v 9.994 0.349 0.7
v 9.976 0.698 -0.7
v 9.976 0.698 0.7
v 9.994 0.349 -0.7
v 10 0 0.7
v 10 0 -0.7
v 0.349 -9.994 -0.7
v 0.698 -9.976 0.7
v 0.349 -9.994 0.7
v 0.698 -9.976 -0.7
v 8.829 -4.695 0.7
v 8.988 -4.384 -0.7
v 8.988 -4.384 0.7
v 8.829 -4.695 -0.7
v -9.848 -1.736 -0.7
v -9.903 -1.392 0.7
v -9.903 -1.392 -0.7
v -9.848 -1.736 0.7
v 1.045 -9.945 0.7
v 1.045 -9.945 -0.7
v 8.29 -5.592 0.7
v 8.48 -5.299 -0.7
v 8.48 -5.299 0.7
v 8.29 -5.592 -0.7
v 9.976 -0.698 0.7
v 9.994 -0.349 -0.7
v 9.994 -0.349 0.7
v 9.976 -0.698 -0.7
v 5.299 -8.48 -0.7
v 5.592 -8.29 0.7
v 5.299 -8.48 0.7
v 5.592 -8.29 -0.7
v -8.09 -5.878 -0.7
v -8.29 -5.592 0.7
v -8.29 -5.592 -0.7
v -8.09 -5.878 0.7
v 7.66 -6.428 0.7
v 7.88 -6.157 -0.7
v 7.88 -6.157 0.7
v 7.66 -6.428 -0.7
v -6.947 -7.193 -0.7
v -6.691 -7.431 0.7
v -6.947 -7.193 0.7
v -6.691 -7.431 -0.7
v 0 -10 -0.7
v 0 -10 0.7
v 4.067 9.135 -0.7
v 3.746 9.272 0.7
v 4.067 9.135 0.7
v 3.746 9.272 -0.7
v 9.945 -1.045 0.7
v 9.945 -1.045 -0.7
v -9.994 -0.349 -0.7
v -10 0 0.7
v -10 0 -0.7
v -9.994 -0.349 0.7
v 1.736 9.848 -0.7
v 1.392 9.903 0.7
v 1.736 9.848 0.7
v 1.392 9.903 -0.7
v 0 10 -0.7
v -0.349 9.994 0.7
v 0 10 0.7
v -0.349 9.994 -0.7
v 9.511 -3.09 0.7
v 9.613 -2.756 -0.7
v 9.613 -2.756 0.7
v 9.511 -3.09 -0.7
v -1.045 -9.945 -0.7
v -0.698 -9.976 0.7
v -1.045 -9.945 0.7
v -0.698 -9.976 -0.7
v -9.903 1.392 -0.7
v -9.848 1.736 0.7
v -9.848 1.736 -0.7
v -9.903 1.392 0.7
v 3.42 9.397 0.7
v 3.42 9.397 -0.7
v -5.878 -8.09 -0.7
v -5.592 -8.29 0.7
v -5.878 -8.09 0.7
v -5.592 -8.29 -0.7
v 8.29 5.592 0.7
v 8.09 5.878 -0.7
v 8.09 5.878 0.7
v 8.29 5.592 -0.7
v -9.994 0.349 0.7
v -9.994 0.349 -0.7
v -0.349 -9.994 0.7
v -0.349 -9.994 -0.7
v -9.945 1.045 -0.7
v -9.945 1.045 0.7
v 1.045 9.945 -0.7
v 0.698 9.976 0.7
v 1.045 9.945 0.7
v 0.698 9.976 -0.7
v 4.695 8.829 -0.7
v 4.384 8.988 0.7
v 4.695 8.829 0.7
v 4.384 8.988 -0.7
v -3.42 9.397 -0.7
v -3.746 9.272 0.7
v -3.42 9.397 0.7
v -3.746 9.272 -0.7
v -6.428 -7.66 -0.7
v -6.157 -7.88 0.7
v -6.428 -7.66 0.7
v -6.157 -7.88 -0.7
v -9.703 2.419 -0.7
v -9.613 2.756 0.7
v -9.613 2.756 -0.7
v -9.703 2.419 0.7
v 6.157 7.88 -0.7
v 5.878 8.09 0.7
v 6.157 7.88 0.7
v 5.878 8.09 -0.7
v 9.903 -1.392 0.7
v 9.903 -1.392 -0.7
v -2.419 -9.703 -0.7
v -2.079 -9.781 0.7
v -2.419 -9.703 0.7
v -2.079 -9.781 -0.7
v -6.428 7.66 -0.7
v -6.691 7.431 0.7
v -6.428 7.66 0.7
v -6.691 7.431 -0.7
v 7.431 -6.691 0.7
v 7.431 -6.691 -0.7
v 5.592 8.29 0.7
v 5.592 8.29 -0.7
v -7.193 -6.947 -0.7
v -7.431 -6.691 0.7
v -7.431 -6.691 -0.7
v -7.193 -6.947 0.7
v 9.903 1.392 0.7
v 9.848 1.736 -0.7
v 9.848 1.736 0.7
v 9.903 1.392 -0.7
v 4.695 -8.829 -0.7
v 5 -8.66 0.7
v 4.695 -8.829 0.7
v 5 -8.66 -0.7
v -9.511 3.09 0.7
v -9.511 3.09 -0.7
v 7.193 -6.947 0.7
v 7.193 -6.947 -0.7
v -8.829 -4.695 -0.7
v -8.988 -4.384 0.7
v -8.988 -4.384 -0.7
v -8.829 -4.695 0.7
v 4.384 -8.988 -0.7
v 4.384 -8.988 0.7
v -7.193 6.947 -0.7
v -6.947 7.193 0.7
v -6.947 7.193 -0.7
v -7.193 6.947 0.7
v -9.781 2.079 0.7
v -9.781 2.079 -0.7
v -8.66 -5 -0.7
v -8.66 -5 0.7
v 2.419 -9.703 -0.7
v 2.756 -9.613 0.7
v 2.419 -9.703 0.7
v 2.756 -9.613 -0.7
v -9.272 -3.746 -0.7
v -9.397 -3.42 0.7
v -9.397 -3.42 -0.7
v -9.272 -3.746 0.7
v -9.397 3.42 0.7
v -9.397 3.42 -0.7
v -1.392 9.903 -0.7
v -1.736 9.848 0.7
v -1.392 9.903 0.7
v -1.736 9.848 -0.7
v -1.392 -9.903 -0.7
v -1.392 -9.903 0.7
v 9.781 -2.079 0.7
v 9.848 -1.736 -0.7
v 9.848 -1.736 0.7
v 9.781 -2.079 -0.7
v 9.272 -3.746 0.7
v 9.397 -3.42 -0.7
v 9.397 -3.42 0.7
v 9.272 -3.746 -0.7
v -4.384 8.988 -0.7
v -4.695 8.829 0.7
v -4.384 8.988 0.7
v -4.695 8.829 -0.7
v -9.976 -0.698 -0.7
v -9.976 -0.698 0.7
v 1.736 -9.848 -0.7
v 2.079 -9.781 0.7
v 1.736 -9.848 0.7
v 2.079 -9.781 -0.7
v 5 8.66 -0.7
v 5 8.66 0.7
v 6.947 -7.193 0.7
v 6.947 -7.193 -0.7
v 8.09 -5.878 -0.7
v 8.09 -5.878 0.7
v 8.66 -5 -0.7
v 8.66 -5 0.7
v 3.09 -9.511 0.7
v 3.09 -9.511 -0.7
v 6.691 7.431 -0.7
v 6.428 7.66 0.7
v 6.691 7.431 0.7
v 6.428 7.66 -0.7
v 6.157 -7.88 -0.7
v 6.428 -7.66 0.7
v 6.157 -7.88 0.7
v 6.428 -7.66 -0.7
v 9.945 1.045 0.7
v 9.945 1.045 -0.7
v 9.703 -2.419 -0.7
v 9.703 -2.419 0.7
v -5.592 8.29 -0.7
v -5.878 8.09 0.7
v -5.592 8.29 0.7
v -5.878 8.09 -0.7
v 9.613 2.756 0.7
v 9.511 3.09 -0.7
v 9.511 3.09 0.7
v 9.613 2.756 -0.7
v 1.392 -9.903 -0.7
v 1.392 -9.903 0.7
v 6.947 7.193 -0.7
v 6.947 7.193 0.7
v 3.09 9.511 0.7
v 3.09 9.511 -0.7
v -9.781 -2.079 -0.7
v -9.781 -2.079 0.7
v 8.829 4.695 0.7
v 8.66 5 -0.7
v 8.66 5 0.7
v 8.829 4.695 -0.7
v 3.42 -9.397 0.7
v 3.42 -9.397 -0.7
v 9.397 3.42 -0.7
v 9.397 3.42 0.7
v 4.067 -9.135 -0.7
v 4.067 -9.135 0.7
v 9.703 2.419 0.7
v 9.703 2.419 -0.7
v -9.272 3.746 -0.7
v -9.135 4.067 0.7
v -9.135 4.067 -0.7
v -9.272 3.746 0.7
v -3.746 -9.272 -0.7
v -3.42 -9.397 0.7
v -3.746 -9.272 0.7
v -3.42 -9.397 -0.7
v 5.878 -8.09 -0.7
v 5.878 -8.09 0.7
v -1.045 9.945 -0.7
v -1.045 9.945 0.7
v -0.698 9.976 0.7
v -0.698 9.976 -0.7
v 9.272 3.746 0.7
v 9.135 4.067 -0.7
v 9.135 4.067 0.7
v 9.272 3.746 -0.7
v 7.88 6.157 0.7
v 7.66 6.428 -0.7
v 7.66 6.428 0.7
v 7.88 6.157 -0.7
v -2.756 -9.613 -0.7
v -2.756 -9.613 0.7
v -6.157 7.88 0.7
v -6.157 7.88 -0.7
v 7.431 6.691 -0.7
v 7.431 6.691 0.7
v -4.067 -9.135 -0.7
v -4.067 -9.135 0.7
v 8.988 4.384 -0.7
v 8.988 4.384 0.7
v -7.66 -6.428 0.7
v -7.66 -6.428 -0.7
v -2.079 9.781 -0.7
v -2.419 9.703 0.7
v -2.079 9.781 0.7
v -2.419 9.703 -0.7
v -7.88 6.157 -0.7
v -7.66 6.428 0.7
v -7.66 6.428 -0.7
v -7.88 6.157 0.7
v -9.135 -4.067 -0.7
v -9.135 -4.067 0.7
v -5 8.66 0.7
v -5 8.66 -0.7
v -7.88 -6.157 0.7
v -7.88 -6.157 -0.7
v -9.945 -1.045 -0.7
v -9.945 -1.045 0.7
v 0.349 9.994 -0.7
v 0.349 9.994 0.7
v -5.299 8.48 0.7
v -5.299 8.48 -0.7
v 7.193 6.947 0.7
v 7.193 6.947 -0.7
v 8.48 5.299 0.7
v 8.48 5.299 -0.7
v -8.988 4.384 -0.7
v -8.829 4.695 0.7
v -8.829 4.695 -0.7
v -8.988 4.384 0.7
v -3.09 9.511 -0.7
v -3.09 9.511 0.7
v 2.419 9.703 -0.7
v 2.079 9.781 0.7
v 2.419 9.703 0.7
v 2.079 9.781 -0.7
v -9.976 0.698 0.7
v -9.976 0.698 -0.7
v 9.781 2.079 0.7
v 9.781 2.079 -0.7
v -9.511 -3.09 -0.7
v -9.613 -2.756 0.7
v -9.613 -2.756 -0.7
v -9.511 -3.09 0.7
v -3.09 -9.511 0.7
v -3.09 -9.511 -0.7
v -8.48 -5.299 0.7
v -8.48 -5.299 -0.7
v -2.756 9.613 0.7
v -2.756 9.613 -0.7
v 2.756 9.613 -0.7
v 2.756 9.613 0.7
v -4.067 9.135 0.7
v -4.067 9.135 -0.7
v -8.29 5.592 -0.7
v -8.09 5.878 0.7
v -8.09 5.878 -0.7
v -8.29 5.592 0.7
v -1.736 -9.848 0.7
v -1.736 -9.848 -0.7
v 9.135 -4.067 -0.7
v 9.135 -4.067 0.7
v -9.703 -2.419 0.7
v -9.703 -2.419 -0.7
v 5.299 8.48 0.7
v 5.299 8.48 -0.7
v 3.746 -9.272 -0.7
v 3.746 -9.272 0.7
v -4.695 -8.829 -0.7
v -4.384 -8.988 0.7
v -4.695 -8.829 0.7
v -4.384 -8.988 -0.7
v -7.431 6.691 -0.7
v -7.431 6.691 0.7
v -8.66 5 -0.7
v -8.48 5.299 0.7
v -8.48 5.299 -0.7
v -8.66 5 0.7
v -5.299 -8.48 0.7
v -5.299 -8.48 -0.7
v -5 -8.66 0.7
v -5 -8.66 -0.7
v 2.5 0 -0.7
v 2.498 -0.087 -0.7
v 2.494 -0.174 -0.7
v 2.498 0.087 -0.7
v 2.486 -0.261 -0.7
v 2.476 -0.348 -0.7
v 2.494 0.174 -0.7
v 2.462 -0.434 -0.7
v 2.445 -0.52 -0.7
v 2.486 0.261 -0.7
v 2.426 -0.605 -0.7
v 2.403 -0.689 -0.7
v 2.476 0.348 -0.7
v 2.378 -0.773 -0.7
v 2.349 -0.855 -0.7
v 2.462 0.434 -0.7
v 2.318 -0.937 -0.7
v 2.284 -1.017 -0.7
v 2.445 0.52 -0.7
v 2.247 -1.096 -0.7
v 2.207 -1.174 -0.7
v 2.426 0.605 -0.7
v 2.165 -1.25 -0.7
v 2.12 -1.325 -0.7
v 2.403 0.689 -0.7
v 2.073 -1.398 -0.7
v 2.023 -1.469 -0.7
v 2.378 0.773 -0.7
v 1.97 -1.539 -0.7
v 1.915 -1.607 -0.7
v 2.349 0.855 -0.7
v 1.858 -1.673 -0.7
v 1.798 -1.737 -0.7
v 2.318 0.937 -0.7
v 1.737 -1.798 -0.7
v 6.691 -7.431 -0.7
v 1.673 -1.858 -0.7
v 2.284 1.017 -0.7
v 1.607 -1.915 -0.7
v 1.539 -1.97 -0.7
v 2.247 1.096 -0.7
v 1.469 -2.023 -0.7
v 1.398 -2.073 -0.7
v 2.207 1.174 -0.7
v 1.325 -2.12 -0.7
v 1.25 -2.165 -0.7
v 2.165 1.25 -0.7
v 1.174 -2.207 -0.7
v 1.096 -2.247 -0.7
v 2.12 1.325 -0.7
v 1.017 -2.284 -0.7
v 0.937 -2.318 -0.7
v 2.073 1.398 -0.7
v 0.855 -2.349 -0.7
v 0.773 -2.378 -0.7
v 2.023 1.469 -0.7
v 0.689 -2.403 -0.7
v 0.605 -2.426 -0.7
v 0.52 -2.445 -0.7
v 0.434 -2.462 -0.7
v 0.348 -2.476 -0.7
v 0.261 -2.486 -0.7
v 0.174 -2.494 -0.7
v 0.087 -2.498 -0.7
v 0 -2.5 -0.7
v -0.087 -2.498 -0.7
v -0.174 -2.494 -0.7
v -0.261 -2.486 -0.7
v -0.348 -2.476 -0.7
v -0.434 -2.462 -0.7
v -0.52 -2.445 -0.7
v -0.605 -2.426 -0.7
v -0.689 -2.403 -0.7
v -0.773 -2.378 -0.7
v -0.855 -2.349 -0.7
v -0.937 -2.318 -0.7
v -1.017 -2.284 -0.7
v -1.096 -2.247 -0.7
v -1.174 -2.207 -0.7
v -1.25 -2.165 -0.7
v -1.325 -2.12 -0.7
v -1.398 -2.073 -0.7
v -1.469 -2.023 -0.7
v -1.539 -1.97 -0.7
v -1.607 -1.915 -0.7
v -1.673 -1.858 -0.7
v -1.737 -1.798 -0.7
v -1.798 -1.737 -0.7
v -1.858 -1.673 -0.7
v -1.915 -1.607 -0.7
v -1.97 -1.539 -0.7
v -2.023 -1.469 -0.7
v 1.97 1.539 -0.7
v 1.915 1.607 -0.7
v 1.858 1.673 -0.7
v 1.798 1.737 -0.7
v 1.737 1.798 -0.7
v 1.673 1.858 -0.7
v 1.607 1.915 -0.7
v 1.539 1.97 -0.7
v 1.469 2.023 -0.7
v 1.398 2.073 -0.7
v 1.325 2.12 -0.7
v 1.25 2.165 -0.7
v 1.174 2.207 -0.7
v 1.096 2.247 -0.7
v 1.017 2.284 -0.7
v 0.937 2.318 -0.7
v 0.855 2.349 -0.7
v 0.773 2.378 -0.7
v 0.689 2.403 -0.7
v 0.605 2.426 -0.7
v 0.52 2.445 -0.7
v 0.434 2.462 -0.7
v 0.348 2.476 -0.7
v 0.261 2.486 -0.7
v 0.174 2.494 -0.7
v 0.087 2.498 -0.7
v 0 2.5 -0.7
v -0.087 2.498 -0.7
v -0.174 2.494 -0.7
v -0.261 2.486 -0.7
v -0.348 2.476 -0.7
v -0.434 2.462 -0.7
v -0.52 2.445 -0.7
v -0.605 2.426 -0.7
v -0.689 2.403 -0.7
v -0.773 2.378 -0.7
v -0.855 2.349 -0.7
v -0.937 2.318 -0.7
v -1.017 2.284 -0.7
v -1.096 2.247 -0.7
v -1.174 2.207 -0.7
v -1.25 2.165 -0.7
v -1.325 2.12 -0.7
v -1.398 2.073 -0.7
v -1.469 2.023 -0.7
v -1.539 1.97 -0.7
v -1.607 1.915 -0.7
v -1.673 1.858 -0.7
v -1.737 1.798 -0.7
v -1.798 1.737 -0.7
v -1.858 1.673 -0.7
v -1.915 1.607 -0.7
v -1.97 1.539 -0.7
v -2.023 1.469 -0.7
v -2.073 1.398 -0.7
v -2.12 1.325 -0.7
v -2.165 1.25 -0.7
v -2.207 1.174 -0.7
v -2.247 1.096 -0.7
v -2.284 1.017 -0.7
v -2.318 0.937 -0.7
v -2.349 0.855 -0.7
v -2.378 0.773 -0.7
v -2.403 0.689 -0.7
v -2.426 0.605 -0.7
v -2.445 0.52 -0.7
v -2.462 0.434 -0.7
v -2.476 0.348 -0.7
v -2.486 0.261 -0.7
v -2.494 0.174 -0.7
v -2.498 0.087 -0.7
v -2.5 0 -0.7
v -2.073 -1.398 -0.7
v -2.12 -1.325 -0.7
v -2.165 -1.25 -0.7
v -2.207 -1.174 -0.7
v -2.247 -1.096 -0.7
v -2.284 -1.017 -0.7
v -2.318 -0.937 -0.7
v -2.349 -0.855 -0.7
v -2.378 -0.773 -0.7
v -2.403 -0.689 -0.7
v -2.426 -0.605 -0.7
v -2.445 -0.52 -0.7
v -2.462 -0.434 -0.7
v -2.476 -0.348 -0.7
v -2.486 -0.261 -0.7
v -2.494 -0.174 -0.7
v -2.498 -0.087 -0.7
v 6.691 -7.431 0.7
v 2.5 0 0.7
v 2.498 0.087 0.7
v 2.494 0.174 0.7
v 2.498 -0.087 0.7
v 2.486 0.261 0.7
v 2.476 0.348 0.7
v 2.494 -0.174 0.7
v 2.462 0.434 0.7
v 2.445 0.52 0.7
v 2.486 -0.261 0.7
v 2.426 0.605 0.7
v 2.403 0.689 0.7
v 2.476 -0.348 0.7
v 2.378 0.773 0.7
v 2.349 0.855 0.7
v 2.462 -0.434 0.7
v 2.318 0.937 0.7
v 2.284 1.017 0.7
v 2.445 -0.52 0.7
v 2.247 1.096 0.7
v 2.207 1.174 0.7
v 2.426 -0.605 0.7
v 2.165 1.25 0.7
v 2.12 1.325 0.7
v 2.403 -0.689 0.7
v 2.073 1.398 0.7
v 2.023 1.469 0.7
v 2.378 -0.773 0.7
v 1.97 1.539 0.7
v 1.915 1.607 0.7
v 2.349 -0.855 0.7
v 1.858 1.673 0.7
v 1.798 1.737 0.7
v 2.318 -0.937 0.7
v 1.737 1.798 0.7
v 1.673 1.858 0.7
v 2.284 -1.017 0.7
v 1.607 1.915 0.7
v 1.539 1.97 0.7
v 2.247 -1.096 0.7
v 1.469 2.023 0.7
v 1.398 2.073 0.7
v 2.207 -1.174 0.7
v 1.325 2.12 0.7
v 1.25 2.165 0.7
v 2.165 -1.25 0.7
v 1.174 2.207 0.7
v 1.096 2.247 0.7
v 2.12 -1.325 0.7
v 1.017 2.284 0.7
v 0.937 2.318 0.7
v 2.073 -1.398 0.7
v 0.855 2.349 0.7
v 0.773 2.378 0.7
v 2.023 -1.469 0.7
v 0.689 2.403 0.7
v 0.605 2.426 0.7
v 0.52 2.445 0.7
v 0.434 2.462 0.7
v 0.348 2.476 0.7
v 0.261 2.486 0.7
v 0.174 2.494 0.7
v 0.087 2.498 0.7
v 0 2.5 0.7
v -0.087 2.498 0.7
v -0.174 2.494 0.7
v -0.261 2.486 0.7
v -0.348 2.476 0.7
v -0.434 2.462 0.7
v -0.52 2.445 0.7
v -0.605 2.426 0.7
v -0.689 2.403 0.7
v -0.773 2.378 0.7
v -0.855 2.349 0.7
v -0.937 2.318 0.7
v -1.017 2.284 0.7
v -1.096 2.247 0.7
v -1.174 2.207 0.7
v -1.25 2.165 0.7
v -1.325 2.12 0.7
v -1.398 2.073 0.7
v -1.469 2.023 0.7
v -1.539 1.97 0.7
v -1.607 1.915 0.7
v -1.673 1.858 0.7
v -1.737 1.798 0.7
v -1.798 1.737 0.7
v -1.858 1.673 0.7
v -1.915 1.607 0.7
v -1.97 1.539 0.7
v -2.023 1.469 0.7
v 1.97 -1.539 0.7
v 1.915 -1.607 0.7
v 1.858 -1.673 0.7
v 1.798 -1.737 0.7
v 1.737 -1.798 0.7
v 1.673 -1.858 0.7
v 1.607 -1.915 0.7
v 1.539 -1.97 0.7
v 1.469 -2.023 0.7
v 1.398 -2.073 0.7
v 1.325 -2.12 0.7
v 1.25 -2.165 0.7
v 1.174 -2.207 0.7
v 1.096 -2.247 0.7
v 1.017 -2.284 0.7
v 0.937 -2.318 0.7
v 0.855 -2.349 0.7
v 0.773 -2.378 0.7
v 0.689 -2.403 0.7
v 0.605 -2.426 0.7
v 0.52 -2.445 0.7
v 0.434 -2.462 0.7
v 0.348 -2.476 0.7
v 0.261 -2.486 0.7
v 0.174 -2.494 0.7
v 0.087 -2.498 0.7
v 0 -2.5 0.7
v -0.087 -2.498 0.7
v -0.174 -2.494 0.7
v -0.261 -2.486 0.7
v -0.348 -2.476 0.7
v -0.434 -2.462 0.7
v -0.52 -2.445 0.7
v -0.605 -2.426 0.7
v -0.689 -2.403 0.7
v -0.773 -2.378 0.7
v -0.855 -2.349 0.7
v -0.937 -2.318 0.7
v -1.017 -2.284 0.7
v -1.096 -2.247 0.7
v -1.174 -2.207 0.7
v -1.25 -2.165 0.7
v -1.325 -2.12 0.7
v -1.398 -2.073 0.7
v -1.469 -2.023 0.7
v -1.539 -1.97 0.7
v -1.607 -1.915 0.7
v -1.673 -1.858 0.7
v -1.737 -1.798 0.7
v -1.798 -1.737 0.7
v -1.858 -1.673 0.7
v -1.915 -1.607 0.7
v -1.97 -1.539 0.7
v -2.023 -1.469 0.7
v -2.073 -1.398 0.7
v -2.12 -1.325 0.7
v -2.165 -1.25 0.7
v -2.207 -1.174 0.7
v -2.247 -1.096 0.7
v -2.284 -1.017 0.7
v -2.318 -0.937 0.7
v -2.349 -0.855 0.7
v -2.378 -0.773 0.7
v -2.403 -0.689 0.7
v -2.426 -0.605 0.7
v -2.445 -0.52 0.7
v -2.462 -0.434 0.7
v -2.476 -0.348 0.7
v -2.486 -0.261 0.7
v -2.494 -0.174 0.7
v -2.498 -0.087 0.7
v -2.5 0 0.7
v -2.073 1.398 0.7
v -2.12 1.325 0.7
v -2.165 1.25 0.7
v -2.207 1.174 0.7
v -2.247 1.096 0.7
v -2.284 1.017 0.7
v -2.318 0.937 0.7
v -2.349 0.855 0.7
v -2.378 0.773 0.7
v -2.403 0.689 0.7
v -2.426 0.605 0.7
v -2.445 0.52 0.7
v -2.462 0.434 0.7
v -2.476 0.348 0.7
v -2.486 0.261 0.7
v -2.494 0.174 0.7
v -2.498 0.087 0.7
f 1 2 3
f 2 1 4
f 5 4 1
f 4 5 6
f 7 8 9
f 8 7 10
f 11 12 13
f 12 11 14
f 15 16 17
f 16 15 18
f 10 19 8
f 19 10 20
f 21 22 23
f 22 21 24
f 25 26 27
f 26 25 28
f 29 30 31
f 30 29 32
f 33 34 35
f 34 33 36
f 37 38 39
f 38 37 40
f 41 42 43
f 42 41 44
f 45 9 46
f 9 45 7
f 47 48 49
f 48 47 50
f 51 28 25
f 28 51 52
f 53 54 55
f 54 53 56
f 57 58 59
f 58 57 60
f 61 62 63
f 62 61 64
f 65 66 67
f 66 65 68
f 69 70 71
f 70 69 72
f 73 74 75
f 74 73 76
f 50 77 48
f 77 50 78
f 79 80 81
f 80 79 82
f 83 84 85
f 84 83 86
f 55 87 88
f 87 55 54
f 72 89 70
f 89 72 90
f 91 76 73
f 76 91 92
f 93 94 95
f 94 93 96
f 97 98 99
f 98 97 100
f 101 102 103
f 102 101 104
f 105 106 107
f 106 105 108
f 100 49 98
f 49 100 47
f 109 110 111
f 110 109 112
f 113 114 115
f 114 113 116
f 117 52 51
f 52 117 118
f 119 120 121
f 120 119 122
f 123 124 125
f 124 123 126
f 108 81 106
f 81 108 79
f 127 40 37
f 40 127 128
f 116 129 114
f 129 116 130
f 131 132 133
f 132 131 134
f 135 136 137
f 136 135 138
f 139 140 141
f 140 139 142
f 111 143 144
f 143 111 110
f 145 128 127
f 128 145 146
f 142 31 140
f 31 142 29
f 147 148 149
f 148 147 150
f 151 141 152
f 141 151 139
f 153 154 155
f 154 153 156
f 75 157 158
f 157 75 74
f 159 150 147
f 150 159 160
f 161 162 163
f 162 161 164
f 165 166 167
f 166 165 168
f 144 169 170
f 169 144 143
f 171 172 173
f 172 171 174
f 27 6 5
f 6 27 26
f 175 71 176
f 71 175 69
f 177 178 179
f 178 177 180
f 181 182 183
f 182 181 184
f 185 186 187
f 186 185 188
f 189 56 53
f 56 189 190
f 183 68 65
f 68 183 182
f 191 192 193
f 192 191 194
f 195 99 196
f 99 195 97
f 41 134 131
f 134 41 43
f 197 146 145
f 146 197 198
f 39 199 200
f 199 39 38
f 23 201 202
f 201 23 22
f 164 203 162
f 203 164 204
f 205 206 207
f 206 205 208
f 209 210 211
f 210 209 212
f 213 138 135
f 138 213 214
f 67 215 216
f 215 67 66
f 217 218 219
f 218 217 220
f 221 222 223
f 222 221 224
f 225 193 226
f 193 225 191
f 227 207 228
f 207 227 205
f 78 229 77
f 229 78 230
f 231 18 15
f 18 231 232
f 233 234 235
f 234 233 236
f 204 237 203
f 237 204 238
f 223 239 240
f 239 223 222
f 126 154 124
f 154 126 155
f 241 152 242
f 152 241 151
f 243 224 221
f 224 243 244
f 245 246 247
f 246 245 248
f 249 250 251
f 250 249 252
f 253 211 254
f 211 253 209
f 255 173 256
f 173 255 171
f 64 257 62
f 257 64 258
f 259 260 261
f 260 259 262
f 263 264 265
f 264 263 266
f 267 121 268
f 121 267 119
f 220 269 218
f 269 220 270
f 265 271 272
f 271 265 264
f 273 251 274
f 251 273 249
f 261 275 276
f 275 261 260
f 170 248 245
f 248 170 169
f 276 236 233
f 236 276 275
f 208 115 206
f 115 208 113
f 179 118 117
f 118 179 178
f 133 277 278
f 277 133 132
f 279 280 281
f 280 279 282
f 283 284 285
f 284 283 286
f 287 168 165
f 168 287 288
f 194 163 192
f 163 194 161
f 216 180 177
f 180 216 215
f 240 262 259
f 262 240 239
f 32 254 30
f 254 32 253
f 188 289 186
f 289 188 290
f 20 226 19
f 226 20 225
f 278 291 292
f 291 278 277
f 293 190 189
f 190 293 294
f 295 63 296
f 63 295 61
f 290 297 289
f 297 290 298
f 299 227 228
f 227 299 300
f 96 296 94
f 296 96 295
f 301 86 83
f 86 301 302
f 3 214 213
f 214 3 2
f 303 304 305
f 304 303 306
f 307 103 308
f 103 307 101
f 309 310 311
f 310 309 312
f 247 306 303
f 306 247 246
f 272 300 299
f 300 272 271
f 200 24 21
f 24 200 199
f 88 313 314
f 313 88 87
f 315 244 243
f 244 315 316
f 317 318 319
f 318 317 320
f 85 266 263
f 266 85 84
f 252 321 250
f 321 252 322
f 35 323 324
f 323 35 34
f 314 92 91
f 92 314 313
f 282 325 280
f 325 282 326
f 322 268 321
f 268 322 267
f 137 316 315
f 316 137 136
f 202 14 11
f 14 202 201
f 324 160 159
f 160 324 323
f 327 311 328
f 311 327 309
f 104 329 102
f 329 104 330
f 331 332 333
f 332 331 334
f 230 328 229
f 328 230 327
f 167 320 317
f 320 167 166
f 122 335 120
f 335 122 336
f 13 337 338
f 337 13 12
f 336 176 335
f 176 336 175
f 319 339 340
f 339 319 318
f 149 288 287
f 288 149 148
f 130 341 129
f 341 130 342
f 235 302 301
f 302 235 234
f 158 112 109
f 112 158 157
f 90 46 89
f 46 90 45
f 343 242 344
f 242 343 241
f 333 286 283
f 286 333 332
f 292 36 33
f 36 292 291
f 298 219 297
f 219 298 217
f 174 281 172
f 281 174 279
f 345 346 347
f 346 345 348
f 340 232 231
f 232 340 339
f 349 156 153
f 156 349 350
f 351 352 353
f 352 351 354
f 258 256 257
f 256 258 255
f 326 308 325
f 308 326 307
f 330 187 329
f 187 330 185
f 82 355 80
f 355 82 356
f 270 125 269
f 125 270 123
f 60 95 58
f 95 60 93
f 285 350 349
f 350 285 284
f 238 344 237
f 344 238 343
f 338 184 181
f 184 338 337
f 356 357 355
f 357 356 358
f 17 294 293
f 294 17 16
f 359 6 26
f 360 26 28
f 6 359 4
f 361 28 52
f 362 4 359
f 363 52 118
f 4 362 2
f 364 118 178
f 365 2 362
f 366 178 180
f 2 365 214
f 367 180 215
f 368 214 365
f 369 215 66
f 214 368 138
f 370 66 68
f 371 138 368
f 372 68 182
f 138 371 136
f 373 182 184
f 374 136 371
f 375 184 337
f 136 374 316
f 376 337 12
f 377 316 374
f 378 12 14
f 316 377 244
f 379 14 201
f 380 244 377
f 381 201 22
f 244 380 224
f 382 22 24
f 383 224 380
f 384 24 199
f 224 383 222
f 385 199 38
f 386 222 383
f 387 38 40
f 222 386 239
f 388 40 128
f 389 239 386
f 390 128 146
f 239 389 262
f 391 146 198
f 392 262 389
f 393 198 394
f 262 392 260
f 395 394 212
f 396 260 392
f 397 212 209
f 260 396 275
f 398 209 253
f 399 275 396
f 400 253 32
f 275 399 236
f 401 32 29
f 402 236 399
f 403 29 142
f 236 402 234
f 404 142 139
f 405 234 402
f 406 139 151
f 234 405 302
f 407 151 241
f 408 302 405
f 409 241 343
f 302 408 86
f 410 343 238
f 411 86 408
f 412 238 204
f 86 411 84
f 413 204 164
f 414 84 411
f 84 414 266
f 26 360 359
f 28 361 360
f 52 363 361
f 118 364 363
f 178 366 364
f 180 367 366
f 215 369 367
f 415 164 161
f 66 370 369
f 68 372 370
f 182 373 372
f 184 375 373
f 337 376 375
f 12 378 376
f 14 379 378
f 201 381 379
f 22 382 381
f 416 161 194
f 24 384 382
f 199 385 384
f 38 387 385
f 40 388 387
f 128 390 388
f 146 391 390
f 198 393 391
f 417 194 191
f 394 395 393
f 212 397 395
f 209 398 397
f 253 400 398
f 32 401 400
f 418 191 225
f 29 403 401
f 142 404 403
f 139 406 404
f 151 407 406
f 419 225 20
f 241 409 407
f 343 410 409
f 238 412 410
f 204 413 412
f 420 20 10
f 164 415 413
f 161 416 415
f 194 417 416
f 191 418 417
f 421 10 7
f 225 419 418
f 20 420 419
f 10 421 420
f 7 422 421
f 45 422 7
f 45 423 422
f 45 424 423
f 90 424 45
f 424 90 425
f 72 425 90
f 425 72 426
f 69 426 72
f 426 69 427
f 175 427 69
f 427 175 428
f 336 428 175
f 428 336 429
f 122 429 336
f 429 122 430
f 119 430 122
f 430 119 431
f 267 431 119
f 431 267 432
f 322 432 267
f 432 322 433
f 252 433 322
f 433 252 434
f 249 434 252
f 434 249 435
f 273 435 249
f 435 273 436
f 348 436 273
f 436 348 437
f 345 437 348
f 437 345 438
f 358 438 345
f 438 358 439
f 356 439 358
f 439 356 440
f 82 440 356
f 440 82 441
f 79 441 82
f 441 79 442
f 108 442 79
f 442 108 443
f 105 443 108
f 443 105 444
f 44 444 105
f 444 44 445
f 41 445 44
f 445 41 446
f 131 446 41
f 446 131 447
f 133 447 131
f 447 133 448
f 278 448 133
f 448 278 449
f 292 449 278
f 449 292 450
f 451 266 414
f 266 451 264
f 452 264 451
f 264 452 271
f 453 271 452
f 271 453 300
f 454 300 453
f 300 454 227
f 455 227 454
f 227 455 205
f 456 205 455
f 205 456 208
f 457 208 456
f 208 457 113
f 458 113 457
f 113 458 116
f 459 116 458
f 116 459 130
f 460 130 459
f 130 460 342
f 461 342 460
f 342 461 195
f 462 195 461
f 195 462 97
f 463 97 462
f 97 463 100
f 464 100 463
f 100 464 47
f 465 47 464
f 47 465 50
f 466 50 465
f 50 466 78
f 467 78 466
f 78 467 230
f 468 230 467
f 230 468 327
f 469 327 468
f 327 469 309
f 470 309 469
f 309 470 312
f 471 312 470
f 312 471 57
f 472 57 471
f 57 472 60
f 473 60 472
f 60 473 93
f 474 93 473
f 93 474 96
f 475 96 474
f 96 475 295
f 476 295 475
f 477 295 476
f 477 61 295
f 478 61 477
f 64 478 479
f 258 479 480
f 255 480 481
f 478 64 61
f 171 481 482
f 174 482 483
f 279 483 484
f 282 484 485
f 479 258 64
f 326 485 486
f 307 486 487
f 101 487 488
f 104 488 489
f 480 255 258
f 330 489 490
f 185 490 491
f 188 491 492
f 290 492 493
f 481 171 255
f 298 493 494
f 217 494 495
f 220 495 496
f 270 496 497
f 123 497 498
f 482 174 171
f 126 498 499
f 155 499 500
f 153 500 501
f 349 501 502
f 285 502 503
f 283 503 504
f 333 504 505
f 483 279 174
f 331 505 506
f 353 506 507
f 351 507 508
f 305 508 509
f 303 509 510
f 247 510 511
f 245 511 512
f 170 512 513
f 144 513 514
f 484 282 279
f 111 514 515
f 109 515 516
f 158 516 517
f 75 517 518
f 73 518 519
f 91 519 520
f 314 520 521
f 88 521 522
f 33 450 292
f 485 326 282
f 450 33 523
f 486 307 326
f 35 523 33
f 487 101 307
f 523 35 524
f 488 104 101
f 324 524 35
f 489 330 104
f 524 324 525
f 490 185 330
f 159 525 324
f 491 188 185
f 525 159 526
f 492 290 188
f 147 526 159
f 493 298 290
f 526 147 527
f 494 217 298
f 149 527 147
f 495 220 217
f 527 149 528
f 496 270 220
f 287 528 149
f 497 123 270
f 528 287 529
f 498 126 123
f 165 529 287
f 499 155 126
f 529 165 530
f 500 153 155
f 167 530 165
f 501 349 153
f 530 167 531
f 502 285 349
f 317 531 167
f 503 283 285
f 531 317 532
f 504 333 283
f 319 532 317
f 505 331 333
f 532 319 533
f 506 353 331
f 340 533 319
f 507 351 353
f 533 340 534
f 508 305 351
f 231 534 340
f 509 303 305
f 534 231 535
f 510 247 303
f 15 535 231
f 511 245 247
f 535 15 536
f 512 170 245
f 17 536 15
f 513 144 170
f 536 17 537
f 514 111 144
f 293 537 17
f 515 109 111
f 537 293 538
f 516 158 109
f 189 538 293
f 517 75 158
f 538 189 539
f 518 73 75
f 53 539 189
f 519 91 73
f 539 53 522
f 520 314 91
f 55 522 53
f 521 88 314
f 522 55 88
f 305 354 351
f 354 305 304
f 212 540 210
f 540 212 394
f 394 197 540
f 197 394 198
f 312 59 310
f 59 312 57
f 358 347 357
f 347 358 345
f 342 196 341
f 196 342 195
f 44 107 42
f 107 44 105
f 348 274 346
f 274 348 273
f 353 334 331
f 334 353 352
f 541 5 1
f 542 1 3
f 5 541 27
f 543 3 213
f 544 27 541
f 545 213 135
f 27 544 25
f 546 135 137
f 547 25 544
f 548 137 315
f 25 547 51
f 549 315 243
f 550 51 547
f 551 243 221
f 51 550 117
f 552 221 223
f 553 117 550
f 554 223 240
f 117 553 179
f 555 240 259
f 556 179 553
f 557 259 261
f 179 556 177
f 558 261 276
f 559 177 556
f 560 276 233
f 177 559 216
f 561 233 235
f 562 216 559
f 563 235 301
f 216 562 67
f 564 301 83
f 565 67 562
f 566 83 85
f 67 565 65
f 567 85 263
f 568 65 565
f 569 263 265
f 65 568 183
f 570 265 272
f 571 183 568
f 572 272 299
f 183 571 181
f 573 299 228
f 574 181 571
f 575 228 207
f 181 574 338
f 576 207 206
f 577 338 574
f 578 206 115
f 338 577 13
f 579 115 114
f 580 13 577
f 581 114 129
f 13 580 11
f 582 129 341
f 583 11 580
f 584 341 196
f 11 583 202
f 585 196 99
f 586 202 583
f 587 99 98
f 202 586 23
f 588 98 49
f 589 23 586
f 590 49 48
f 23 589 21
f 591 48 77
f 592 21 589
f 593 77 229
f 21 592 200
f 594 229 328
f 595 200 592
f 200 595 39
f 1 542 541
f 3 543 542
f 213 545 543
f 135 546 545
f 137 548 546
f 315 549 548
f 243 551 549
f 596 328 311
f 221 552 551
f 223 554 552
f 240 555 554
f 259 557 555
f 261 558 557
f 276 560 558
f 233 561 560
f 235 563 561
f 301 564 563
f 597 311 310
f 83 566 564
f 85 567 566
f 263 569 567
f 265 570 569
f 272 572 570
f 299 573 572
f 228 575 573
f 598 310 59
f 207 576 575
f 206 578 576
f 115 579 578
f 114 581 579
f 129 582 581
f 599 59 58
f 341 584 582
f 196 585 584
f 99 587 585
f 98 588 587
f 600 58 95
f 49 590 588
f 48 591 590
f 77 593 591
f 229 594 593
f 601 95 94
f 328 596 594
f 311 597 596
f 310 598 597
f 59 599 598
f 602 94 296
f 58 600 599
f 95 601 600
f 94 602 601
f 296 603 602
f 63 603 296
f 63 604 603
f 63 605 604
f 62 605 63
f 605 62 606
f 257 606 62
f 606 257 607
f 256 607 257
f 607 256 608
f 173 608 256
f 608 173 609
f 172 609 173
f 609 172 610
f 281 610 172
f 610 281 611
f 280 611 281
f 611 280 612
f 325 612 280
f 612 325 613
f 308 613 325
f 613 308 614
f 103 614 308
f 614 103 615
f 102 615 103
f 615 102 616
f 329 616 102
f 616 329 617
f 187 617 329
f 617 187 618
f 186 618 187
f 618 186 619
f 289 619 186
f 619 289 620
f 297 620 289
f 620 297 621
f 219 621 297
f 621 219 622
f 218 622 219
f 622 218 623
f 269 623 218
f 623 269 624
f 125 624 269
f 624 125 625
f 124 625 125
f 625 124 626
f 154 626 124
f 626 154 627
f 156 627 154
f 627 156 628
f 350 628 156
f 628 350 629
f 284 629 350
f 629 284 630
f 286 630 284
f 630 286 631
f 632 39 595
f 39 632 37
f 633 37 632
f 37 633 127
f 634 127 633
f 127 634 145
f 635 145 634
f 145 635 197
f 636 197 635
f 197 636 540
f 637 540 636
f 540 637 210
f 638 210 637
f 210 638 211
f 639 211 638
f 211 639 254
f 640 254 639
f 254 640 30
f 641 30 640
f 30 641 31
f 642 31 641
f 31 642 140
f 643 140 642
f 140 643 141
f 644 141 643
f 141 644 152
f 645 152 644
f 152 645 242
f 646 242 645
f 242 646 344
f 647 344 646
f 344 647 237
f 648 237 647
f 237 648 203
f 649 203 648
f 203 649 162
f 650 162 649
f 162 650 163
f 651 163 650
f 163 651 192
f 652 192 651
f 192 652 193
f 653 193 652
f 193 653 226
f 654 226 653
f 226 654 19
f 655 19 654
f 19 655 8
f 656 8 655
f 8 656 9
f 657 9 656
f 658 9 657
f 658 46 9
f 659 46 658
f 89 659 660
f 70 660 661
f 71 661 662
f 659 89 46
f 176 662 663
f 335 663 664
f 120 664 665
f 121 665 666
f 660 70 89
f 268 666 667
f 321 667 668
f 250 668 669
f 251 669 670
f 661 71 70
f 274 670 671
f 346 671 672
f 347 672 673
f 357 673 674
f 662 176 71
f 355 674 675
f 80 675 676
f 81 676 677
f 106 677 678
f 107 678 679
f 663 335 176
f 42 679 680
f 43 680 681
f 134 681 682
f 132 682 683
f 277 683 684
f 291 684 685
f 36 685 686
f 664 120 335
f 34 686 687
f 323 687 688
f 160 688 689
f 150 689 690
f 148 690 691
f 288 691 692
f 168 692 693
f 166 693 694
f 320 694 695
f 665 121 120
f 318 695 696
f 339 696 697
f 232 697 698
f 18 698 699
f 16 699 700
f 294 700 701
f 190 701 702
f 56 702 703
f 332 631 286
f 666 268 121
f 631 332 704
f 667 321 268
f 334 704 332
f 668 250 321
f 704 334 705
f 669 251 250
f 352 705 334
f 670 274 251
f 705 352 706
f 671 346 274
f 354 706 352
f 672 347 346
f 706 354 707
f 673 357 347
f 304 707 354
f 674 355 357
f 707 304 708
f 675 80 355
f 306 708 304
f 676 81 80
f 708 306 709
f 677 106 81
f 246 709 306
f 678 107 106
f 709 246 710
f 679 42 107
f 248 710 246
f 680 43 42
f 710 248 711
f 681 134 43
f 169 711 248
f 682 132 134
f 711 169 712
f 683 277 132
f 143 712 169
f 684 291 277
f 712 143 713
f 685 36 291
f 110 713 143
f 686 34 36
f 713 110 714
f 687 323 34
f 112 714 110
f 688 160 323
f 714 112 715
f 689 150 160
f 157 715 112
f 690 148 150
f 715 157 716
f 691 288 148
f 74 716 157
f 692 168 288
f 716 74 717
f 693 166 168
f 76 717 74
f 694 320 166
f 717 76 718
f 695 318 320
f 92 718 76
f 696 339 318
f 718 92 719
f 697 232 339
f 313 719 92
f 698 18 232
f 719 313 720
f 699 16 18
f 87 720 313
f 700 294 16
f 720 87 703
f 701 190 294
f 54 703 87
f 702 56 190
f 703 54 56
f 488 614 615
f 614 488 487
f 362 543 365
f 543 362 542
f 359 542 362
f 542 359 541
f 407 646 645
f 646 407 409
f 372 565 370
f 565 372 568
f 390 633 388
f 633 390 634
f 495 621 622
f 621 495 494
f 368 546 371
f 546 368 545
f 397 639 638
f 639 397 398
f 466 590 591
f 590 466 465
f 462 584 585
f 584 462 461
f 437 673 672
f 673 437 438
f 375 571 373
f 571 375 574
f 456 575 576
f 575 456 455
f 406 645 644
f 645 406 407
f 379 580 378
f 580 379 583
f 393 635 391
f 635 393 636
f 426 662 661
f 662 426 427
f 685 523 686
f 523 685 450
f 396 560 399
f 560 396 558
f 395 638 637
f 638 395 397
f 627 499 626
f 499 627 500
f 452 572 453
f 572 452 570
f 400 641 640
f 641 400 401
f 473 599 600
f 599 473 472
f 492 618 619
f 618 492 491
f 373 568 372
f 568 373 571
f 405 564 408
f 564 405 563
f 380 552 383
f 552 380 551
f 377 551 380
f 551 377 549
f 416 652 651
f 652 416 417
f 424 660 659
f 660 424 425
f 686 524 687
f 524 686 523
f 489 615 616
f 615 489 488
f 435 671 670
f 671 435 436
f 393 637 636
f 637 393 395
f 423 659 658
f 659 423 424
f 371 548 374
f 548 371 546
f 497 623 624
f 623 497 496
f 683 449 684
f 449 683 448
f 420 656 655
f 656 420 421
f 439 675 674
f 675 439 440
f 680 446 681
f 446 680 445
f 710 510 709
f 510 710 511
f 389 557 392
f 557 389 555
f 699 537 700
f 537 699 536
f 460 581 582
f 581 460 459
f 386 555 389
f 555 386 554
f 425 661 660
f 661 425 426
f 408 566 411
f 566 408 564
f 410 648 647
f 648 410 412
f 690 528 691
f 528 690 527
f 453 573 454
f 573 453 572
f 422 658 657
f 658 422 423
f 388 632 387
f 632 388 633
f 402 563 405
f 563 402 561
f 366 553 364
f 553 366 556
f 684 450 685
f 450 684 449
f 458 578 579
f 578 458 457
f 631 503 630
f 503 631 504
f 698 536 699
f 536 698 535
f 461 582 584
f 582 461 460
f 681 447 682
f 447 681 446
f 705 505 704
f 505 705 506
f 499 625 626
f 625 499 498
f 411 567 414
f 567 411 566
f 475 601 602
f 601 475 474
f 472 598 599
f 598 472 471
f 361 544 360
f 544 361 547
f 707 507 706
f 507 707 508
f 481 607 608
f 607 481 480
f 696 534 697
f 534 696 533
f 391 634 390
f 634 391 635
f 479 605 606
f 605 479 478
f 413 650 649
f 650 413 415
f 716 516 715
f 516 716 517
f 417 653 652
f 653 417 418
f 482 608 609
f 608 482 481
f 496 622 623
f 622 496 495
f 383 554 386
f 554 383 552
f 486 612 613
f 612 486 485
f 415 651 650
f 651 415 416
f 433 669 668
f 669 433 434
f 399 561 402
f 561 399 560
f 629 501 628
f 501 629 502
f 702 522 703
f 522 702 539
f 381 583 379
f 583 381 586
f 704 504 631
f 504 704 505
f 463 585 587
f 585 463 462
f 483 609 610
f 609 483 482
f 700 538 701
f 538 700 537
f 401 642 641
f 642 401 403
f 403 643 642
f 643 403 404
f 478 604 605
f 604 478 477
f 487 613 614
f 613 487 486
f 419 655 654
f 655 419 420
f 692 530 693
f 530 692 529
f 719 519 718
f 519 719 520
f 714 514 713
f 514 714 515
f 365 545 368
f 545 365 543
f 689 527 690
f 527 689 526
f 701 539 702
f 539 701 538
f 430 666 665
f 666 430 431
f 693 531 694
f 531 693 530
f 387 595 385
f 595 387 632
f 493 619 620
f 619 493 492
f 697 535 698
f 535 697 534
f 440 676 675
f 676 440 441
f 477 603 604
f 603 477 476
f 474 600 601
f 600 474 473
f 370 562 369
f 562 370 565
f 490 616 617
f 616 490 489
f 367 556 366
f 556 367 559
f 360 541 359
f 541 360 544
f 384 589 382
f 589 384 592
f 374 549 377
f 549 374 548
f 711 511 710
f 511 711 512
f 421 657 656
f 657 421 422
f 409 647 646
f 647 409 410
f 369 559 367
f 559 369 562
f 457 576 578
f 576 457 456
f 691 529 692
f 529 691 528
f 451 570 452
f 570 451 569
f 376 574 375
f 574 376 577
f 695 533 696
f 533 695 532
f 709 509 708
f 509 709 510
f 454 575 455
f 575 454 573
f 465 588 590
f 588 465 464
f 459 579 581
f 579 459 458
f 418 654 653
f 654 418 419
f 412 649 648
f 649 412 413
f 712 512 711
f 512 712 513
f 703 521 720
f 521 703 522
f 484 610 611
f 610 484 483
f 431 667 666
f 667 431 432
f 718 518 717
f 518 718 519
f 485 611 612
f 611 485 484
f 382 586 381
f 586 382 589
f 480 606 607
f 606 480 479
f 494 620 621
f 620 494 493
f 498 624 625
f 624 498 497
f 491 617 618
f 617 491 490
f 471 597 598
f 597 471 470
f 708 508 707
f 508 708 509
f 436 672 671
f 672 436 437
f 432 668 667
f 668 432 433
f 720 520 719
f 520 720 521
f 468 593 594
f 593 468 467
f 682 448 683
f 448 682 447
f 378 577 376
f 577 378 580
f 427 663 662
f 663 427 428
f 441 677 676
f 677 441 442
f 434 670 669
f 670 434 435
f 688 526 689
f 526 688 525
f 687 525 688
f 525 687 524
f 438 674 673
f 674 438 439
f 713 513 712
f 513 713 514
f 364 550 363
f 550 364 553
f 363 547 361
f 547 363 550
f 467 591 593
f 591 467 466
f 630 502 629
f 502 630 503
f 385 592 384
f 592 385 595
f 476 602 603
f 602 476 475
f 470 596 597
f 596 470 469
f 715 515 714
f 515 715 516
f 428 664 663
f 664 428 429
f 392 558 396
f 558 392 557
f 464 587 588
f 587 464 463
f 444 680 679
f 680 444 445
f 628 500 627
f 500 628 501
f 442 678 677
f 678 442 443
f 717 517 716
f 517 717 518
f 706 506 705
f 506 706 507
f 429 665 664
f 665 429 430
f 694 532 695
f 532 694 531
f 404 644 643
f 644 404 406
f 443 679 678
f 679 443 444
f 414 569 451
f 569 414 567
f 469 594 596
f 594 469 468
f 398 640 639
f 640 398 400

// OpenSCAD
// Penny washer: 5.0mm ID, 20.0mm OD, 1.4mm thickness

inner_diameter_mm = 5.0;
outer_diameter_mm = 20.0;
thickness_mm      = 1.4;

eps_mm = 0.02;                 // small cut-through margin
$fn = 180;                     // high resolution for truly round holes

module penny_washer(id=inner_diameter_mm, od=outer_diameter_mm, t=thickness_mm) {
    difference() {
        cylinder(d=od, h=t, center=true);
        cylinder(d=id, h=t + 2*eps_mm, center=true);
    }
}

penny_washer();
